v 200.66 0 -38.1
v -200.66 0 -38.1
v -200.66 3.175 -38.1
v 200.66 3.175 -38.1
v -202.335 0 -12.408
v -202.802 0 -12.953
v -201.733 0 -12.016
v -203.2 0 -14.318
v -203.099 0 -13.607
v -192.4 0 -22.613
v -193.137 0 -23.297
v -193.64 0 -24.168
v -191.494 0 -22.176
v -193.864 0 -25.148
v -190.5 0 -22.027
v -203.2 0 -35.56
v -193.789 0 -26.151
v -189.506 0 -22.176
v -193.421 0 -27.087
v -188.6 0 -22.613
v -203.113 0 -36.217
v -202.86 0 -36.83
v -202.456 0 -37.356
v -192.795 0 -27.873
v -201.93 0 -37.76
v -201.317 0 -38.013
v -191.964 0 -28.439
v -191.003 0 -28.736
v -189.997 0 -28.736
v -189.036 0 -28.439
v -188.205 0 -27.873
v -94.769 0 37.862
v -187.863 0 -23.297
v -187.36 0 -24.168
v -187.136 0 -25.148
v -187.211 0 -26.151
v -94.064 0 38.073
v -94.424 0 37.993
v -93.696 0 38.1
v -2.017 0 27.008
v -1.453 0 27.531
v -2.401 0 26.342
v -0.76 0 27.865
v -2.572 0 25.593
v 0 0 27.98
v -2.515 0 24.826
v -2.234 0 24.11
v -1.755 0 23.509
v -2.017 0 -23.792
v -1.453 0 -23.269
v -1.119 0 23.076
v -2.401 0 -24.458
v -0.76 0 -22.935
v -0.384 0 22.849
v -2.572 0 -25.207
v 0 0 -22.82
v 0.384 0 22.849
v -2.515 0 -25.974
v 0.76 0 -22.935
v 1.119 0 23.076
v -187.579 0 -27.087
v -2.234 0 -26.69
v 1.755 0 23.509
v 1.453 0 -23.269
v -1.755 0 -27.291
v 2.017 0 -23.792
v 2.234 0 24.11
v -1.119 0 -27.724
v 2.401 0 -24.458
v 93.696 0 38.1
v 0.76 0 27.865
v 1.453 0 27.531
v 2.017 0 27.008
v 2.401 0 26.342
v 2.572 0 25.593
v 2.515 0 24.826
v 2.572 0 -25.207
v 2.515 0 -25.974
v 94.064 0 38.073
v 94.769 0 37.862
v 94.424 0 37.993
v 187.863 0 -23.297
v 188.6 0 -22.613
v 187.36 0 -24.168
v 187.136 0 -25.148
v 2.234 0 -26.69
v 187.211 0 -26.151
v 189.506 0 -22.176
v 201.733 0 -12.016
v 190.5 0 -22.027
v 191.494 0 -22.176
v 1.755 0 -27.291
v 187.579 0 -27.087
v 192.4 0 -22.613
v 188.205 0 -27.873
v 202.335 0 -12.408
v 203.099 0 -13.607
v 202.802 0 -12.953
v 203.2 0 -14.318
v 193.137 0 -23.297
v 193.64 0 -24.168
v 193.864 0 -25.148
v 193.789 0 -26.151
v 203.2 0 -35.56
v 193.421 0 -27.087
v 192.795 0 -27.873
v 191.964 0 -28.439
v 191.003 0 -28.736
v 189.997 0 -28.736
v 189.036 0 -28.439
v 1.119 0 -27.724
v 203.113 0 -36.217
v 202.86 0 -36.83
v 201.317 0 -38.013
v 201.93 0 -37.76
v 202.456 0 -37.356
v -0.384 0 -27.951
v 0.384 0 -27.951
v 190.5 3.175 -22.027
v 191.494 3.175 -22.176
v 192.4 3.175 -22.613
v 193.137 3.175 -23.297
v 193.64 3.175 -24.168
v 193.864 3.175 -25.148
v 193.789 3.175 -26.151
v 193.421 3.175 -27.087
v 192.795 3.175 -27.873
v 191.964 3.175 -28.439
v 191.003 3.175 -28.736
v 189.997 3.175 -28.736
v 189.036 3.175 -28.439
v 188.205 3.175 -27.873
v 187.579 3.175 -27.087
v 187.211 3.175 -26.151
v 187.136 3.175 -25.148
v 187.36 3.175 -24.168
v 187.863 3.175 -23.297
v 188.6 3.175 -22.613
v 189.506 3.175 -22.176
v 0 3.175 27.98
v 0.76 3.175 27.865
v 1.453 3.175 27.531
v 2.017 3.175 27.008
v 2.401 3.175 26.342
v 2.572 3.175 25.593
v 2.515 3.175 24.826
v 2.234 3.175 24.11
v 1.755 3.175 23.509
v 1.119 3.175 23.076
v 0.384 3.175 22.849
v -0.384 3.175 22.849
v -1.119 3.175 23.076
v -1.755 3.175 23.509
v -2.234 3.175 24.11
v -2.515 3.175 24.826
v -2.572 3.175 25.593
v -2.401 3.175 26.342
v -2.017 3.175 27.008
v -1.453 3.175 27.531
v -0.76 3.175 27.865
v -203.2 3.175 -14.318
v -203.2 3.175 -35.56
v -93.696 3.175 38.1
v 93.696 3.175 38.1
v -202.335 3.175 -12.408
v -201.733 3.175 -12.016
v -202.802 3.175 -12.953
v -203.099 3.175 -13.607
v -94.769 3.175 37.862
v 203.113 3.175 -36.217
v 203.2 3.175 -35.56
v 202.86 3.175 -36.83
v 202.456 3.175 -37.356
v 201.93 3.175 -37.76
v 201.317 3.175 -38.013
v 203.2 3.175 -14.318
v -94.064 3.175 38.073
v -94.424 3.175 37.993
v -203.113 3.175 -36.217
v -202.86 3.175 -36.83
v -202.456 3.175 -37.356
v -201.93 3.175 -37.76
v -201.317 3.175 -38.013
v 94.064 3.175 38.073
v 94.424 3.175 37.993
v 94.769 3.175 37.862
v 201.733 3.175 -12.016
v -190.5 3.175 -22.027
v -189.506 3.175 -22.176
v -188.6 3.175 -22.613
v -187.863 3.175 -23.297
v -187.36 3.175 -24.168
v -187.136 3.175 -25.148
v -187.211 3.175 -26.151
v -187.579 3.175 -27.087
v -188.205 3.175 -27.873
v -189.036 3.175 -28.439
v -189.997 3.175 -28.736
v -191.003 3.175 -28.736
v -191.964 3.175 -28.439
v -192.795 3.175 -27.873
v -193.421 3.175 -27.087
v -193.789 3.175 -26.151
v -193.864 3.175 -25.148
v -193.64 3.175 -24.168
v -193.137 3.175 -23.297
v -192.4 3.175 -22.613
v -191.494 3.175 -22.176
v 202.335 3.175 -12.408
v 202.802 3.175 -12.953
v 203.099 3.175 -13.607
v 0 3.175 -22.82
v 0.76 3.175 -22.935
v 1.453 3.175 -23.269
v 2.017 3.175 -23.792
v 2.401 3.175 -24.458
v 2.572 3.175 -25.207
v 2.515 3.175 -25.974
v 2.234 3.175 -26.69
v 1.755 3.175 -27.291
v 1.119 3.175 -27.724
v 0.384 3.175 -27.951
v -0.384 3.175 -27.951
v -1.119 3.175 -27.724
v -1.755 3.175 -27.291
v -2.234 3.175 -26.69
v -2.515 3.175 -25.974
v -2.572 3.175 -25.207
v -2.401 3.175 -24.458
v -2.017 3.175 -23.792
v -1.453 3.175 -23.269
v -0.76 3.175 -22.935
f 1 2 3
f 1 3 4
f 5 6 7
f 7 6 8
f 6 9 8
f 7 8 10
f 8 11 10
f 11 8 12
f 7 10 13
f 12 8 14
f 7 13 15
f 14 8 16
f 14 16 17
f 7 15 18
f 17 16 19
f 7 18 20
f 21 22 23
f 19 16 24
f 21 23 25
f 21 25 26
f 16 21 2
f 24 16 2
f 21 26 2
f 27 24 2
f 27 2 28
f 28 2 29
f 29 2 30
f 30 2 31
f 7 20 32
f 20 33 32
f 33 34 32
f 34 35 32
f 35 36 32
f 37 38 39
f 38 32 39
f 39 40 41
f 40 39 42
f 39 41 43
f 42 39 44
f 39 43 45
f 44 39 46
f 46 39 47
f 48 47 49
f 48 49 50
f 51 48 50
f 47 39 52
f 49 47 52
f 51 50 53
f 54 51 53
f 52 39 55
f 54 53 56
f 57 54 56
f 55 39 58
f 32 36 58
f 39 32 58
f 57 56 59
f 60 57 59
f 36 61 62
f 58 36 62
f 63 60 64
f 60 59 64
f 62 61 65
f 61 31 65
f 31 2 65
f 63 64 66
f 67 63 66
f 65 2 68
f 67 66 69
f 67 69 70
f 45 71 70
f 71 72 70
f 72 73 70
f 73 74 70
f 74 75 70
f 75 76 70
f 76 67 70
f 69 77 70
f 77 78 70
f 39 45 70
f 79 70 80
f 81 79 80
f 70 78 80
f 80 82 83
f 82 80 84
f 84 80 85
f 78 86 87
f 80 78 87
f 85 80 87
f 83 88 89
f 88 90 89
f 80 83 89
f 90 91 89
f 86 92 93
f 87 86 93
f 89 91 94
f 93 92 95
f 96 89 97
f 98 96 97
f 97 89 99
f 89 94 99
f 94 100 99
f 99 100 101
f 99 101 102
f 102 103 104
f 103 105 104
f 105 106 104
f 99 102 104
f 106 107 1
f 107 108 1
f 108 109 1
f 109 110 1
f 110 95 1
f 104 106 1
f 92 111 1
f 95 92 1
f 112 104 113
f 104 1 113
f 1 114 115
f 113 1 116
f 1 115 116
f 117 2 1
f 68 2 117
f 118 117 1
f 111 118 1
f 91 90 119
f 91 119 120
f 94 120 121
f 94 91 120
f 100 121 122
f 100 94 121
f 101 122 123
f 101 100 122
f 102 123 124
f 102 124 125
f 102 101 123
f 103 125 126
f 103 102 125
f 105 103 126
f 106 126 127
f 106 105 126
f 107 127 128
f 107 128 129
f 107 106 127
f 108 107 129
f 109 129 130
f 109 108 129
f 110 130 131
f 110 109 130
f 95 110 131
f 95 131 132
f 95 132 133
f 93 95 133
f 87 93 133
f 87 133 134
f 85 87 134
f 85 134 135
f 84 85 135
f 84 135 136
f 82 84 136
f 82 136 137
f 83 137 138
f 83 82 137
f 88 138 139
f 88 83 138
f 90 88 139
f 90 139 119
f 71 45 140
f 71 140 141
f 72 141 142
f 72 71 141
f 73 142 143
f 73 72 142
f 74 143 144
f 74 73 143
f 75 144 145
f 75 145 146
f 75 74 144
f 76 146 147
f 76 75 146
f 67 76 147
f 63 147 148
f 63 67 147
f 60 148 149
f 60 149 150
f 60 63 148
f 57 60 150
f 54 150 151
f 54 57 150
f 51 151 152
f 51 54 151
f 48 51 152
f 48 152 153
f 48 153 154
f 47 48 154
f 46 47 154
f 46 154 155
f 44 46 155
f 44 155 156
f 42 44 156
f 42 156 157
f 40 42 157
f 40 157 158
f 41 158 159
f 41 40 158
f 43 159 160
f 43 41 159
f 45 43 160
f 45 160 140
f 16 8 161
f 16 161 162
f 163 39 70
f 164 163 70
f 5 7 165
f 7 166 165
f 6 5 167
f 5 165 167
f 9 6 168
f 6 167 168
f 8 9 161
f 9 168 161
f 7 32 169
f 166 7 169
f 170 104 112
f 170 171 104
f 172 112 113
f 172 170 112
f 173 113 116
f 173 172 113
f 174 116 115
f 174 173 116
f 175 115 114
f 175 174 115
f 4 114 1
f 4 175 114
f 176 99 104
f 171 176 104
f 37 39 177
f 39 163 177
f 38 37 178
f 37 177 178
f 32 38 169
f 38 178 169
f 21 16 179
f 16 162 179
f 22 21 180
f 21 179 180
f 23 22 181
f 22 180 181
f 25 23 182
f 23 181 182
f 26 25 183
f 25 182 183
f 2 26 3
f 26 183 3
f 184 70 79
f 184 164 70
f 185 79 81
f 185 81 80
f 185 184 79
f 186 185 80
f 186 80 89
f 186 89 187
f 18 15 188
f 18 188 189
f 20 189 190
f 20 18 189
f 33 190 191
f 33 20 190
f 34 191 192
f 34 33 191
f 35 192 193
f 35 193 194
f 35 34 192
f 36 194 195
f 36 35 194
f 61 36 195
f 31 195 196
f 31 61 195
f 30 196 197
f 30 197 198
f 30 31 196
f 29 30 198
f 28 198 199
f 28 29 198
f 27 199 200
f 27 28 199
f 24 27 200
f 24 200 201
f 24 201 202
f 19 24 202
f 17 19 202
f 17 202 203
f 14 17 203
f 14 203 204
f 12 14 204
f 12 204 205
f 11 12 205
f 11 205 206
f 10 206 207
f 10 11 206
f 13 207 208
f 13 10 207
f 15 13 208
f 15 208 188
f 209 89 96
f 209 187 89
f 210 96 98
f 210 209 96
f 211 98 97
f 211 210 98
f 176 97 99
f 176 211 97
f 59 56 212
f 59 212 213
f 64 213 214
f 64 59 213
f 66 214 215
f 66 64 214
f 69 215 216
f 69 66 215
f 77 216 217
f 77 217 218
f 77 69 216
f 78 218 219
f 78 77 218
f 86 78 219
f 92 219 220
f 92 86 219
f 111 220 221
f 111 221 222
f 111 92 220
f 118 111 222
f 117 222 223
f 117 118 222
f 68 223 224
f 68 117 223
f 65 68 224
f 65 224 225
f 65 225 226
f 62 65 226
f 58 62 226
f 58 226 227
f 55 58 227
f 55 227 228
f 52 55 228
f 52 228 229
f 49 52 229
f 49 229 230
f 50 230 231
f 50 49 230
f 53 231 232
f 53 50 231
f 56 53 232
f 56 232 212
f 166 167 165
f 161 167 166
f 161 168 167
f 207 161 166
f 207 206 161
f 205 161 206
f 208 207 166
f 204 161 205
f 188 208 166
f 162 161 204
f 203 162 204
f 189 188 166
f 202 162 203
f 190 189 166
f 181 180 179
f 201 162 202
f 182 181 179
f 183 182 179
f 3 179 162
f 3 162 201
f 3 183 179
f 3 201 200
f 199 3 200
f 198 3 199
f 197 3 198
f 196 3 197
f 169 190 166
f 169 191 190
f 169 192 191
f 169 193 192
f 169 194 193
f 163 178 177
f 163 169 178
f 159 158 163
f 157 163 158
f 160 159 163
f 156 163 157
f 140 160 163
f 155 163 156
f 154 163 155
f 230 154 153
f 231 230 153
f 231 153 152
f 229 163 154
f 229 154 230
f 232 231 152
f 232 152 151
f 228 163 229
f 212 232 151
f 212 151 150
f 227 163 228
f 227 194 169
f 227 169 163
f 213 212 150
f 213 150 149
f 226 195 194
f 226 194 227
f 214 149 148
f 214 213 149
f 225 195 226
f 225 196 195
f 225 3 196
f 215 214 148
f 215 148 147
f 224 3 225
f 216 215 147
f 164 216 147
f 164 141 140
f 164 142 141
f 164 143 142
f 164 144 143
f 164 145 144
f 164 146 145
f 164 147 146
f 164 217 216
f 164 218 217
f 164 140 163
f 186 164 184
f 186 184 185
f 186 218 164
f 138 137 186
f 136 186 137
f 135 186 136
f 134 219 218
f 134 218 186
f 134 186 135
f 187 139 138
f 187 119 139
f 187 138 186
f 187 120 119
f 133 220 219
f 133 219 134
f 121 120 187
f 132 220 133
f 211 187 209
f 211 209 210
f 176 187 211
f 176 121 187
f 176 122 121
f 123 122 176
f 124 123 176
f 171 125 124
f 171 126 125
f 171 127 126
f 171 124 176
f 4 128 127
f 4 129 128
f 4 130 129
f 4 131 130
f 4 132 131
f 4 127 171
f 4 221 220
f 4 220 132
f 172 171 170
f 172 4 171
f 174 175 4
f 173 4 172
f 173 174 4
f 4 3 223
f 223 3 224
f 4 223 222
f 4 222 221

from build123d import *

# Parameters (mm, degrees)
SKETCH1_W           = 406.4
SKETCH1_H           = 76.2
SKETCH1_R           = 3.3734375
SKETCH1_R_2         = 2.5796875
BOSS_EXTRUDE1_DEPTH = 3.175
CHAMFER1_SIZE       = 50.8
CHAMFER1_SIZE2      = 108.940951562
CHAMFER2_SIZE       = 50.8
CHAMFER2_SIZE2      = 108.940951562
FILLET1_R           = 2.54


with BuildPart() as part:
    # Sketch1 → Boss-Extrude1 (new body)
    with BuildSketch(Plane(origin=(0, 0, 0), x_dir=(1, 0, 0), z_dir=(0, 1, 0))):
        Rectangle(SKETCH1_W, SKETCH1_H)
        with Locations(Location((-190.5, 25.4, 0), (0, 0, 270))):
            Circle(SKETCH1_R, mode=Mode.SUBTRACT)
        with Locations(Location((190.5, 25.4, 0), (0, 0, 270))):
            Circle(SKETCH1_R, mode=Mode.SUBTRACT)
        with Locations(Location((0, 25.4, 0), (0, 0, 270))):
            Circle(SKETCH1_R_2, mode=Mode.SUBTRACT)
        with Locations(Location((0, -25.4, 0), (0, 0, 270))):
            Circle(SKETCH1_R_2, mode=Mode.SUBTRACT)
    extrude(amount=BOSS_EXTRUDE1_DEPTH)

    # Chamfer1
    chamfer1_edges = [part.edges().sort_by_distance(p)[0] for p in [
        (-203.2, 1.5875, 38.1),
    ]]
    chamfer1_side = [part.faces().sort_by_distance(p)[0] for p in [
        (-203.2, 1.5875, 0),
    ]]
    chamfer(chamfer1_edges, length=CHAMFER1_SIZE, length2=CHAMFER1_SIZE2, reference=chamfer1_side[0])

    # Chamfer2
    chamfer2_edges = [part.edges().sort_by_distance(p)[0] for p in [
        (203.2, 1.5875, 38.1),
    ]]
    chamfer2_side = [part.faces().sort_by_distance(p)[0] for p in [
        (203.2, 1.5875, 0),
    ]]
    chamfer(chamfer2_edges, length=CHAMFER2_SIZE, length2=CHAMFER2_SIZE2, reference=chamfer2_side[0])

    # Fillet1
    fillet1_edges = [part.edges().sort_by_distance(p)[0] for p in [
        (-94.259048438, 1.5875, 38.1),
        (-203.2, 1.5875, -12.7),
        (203.2, 1.5875, -12.7),
        (94.259048438, 1.5875, 38.1),
        (-203.2, 1.5875, -38.1),
        (203.2, 1.5875, -38.1),
    ]]
    fillet(fillet1_edges, radius=FILLET1_R)


solid = part.part
